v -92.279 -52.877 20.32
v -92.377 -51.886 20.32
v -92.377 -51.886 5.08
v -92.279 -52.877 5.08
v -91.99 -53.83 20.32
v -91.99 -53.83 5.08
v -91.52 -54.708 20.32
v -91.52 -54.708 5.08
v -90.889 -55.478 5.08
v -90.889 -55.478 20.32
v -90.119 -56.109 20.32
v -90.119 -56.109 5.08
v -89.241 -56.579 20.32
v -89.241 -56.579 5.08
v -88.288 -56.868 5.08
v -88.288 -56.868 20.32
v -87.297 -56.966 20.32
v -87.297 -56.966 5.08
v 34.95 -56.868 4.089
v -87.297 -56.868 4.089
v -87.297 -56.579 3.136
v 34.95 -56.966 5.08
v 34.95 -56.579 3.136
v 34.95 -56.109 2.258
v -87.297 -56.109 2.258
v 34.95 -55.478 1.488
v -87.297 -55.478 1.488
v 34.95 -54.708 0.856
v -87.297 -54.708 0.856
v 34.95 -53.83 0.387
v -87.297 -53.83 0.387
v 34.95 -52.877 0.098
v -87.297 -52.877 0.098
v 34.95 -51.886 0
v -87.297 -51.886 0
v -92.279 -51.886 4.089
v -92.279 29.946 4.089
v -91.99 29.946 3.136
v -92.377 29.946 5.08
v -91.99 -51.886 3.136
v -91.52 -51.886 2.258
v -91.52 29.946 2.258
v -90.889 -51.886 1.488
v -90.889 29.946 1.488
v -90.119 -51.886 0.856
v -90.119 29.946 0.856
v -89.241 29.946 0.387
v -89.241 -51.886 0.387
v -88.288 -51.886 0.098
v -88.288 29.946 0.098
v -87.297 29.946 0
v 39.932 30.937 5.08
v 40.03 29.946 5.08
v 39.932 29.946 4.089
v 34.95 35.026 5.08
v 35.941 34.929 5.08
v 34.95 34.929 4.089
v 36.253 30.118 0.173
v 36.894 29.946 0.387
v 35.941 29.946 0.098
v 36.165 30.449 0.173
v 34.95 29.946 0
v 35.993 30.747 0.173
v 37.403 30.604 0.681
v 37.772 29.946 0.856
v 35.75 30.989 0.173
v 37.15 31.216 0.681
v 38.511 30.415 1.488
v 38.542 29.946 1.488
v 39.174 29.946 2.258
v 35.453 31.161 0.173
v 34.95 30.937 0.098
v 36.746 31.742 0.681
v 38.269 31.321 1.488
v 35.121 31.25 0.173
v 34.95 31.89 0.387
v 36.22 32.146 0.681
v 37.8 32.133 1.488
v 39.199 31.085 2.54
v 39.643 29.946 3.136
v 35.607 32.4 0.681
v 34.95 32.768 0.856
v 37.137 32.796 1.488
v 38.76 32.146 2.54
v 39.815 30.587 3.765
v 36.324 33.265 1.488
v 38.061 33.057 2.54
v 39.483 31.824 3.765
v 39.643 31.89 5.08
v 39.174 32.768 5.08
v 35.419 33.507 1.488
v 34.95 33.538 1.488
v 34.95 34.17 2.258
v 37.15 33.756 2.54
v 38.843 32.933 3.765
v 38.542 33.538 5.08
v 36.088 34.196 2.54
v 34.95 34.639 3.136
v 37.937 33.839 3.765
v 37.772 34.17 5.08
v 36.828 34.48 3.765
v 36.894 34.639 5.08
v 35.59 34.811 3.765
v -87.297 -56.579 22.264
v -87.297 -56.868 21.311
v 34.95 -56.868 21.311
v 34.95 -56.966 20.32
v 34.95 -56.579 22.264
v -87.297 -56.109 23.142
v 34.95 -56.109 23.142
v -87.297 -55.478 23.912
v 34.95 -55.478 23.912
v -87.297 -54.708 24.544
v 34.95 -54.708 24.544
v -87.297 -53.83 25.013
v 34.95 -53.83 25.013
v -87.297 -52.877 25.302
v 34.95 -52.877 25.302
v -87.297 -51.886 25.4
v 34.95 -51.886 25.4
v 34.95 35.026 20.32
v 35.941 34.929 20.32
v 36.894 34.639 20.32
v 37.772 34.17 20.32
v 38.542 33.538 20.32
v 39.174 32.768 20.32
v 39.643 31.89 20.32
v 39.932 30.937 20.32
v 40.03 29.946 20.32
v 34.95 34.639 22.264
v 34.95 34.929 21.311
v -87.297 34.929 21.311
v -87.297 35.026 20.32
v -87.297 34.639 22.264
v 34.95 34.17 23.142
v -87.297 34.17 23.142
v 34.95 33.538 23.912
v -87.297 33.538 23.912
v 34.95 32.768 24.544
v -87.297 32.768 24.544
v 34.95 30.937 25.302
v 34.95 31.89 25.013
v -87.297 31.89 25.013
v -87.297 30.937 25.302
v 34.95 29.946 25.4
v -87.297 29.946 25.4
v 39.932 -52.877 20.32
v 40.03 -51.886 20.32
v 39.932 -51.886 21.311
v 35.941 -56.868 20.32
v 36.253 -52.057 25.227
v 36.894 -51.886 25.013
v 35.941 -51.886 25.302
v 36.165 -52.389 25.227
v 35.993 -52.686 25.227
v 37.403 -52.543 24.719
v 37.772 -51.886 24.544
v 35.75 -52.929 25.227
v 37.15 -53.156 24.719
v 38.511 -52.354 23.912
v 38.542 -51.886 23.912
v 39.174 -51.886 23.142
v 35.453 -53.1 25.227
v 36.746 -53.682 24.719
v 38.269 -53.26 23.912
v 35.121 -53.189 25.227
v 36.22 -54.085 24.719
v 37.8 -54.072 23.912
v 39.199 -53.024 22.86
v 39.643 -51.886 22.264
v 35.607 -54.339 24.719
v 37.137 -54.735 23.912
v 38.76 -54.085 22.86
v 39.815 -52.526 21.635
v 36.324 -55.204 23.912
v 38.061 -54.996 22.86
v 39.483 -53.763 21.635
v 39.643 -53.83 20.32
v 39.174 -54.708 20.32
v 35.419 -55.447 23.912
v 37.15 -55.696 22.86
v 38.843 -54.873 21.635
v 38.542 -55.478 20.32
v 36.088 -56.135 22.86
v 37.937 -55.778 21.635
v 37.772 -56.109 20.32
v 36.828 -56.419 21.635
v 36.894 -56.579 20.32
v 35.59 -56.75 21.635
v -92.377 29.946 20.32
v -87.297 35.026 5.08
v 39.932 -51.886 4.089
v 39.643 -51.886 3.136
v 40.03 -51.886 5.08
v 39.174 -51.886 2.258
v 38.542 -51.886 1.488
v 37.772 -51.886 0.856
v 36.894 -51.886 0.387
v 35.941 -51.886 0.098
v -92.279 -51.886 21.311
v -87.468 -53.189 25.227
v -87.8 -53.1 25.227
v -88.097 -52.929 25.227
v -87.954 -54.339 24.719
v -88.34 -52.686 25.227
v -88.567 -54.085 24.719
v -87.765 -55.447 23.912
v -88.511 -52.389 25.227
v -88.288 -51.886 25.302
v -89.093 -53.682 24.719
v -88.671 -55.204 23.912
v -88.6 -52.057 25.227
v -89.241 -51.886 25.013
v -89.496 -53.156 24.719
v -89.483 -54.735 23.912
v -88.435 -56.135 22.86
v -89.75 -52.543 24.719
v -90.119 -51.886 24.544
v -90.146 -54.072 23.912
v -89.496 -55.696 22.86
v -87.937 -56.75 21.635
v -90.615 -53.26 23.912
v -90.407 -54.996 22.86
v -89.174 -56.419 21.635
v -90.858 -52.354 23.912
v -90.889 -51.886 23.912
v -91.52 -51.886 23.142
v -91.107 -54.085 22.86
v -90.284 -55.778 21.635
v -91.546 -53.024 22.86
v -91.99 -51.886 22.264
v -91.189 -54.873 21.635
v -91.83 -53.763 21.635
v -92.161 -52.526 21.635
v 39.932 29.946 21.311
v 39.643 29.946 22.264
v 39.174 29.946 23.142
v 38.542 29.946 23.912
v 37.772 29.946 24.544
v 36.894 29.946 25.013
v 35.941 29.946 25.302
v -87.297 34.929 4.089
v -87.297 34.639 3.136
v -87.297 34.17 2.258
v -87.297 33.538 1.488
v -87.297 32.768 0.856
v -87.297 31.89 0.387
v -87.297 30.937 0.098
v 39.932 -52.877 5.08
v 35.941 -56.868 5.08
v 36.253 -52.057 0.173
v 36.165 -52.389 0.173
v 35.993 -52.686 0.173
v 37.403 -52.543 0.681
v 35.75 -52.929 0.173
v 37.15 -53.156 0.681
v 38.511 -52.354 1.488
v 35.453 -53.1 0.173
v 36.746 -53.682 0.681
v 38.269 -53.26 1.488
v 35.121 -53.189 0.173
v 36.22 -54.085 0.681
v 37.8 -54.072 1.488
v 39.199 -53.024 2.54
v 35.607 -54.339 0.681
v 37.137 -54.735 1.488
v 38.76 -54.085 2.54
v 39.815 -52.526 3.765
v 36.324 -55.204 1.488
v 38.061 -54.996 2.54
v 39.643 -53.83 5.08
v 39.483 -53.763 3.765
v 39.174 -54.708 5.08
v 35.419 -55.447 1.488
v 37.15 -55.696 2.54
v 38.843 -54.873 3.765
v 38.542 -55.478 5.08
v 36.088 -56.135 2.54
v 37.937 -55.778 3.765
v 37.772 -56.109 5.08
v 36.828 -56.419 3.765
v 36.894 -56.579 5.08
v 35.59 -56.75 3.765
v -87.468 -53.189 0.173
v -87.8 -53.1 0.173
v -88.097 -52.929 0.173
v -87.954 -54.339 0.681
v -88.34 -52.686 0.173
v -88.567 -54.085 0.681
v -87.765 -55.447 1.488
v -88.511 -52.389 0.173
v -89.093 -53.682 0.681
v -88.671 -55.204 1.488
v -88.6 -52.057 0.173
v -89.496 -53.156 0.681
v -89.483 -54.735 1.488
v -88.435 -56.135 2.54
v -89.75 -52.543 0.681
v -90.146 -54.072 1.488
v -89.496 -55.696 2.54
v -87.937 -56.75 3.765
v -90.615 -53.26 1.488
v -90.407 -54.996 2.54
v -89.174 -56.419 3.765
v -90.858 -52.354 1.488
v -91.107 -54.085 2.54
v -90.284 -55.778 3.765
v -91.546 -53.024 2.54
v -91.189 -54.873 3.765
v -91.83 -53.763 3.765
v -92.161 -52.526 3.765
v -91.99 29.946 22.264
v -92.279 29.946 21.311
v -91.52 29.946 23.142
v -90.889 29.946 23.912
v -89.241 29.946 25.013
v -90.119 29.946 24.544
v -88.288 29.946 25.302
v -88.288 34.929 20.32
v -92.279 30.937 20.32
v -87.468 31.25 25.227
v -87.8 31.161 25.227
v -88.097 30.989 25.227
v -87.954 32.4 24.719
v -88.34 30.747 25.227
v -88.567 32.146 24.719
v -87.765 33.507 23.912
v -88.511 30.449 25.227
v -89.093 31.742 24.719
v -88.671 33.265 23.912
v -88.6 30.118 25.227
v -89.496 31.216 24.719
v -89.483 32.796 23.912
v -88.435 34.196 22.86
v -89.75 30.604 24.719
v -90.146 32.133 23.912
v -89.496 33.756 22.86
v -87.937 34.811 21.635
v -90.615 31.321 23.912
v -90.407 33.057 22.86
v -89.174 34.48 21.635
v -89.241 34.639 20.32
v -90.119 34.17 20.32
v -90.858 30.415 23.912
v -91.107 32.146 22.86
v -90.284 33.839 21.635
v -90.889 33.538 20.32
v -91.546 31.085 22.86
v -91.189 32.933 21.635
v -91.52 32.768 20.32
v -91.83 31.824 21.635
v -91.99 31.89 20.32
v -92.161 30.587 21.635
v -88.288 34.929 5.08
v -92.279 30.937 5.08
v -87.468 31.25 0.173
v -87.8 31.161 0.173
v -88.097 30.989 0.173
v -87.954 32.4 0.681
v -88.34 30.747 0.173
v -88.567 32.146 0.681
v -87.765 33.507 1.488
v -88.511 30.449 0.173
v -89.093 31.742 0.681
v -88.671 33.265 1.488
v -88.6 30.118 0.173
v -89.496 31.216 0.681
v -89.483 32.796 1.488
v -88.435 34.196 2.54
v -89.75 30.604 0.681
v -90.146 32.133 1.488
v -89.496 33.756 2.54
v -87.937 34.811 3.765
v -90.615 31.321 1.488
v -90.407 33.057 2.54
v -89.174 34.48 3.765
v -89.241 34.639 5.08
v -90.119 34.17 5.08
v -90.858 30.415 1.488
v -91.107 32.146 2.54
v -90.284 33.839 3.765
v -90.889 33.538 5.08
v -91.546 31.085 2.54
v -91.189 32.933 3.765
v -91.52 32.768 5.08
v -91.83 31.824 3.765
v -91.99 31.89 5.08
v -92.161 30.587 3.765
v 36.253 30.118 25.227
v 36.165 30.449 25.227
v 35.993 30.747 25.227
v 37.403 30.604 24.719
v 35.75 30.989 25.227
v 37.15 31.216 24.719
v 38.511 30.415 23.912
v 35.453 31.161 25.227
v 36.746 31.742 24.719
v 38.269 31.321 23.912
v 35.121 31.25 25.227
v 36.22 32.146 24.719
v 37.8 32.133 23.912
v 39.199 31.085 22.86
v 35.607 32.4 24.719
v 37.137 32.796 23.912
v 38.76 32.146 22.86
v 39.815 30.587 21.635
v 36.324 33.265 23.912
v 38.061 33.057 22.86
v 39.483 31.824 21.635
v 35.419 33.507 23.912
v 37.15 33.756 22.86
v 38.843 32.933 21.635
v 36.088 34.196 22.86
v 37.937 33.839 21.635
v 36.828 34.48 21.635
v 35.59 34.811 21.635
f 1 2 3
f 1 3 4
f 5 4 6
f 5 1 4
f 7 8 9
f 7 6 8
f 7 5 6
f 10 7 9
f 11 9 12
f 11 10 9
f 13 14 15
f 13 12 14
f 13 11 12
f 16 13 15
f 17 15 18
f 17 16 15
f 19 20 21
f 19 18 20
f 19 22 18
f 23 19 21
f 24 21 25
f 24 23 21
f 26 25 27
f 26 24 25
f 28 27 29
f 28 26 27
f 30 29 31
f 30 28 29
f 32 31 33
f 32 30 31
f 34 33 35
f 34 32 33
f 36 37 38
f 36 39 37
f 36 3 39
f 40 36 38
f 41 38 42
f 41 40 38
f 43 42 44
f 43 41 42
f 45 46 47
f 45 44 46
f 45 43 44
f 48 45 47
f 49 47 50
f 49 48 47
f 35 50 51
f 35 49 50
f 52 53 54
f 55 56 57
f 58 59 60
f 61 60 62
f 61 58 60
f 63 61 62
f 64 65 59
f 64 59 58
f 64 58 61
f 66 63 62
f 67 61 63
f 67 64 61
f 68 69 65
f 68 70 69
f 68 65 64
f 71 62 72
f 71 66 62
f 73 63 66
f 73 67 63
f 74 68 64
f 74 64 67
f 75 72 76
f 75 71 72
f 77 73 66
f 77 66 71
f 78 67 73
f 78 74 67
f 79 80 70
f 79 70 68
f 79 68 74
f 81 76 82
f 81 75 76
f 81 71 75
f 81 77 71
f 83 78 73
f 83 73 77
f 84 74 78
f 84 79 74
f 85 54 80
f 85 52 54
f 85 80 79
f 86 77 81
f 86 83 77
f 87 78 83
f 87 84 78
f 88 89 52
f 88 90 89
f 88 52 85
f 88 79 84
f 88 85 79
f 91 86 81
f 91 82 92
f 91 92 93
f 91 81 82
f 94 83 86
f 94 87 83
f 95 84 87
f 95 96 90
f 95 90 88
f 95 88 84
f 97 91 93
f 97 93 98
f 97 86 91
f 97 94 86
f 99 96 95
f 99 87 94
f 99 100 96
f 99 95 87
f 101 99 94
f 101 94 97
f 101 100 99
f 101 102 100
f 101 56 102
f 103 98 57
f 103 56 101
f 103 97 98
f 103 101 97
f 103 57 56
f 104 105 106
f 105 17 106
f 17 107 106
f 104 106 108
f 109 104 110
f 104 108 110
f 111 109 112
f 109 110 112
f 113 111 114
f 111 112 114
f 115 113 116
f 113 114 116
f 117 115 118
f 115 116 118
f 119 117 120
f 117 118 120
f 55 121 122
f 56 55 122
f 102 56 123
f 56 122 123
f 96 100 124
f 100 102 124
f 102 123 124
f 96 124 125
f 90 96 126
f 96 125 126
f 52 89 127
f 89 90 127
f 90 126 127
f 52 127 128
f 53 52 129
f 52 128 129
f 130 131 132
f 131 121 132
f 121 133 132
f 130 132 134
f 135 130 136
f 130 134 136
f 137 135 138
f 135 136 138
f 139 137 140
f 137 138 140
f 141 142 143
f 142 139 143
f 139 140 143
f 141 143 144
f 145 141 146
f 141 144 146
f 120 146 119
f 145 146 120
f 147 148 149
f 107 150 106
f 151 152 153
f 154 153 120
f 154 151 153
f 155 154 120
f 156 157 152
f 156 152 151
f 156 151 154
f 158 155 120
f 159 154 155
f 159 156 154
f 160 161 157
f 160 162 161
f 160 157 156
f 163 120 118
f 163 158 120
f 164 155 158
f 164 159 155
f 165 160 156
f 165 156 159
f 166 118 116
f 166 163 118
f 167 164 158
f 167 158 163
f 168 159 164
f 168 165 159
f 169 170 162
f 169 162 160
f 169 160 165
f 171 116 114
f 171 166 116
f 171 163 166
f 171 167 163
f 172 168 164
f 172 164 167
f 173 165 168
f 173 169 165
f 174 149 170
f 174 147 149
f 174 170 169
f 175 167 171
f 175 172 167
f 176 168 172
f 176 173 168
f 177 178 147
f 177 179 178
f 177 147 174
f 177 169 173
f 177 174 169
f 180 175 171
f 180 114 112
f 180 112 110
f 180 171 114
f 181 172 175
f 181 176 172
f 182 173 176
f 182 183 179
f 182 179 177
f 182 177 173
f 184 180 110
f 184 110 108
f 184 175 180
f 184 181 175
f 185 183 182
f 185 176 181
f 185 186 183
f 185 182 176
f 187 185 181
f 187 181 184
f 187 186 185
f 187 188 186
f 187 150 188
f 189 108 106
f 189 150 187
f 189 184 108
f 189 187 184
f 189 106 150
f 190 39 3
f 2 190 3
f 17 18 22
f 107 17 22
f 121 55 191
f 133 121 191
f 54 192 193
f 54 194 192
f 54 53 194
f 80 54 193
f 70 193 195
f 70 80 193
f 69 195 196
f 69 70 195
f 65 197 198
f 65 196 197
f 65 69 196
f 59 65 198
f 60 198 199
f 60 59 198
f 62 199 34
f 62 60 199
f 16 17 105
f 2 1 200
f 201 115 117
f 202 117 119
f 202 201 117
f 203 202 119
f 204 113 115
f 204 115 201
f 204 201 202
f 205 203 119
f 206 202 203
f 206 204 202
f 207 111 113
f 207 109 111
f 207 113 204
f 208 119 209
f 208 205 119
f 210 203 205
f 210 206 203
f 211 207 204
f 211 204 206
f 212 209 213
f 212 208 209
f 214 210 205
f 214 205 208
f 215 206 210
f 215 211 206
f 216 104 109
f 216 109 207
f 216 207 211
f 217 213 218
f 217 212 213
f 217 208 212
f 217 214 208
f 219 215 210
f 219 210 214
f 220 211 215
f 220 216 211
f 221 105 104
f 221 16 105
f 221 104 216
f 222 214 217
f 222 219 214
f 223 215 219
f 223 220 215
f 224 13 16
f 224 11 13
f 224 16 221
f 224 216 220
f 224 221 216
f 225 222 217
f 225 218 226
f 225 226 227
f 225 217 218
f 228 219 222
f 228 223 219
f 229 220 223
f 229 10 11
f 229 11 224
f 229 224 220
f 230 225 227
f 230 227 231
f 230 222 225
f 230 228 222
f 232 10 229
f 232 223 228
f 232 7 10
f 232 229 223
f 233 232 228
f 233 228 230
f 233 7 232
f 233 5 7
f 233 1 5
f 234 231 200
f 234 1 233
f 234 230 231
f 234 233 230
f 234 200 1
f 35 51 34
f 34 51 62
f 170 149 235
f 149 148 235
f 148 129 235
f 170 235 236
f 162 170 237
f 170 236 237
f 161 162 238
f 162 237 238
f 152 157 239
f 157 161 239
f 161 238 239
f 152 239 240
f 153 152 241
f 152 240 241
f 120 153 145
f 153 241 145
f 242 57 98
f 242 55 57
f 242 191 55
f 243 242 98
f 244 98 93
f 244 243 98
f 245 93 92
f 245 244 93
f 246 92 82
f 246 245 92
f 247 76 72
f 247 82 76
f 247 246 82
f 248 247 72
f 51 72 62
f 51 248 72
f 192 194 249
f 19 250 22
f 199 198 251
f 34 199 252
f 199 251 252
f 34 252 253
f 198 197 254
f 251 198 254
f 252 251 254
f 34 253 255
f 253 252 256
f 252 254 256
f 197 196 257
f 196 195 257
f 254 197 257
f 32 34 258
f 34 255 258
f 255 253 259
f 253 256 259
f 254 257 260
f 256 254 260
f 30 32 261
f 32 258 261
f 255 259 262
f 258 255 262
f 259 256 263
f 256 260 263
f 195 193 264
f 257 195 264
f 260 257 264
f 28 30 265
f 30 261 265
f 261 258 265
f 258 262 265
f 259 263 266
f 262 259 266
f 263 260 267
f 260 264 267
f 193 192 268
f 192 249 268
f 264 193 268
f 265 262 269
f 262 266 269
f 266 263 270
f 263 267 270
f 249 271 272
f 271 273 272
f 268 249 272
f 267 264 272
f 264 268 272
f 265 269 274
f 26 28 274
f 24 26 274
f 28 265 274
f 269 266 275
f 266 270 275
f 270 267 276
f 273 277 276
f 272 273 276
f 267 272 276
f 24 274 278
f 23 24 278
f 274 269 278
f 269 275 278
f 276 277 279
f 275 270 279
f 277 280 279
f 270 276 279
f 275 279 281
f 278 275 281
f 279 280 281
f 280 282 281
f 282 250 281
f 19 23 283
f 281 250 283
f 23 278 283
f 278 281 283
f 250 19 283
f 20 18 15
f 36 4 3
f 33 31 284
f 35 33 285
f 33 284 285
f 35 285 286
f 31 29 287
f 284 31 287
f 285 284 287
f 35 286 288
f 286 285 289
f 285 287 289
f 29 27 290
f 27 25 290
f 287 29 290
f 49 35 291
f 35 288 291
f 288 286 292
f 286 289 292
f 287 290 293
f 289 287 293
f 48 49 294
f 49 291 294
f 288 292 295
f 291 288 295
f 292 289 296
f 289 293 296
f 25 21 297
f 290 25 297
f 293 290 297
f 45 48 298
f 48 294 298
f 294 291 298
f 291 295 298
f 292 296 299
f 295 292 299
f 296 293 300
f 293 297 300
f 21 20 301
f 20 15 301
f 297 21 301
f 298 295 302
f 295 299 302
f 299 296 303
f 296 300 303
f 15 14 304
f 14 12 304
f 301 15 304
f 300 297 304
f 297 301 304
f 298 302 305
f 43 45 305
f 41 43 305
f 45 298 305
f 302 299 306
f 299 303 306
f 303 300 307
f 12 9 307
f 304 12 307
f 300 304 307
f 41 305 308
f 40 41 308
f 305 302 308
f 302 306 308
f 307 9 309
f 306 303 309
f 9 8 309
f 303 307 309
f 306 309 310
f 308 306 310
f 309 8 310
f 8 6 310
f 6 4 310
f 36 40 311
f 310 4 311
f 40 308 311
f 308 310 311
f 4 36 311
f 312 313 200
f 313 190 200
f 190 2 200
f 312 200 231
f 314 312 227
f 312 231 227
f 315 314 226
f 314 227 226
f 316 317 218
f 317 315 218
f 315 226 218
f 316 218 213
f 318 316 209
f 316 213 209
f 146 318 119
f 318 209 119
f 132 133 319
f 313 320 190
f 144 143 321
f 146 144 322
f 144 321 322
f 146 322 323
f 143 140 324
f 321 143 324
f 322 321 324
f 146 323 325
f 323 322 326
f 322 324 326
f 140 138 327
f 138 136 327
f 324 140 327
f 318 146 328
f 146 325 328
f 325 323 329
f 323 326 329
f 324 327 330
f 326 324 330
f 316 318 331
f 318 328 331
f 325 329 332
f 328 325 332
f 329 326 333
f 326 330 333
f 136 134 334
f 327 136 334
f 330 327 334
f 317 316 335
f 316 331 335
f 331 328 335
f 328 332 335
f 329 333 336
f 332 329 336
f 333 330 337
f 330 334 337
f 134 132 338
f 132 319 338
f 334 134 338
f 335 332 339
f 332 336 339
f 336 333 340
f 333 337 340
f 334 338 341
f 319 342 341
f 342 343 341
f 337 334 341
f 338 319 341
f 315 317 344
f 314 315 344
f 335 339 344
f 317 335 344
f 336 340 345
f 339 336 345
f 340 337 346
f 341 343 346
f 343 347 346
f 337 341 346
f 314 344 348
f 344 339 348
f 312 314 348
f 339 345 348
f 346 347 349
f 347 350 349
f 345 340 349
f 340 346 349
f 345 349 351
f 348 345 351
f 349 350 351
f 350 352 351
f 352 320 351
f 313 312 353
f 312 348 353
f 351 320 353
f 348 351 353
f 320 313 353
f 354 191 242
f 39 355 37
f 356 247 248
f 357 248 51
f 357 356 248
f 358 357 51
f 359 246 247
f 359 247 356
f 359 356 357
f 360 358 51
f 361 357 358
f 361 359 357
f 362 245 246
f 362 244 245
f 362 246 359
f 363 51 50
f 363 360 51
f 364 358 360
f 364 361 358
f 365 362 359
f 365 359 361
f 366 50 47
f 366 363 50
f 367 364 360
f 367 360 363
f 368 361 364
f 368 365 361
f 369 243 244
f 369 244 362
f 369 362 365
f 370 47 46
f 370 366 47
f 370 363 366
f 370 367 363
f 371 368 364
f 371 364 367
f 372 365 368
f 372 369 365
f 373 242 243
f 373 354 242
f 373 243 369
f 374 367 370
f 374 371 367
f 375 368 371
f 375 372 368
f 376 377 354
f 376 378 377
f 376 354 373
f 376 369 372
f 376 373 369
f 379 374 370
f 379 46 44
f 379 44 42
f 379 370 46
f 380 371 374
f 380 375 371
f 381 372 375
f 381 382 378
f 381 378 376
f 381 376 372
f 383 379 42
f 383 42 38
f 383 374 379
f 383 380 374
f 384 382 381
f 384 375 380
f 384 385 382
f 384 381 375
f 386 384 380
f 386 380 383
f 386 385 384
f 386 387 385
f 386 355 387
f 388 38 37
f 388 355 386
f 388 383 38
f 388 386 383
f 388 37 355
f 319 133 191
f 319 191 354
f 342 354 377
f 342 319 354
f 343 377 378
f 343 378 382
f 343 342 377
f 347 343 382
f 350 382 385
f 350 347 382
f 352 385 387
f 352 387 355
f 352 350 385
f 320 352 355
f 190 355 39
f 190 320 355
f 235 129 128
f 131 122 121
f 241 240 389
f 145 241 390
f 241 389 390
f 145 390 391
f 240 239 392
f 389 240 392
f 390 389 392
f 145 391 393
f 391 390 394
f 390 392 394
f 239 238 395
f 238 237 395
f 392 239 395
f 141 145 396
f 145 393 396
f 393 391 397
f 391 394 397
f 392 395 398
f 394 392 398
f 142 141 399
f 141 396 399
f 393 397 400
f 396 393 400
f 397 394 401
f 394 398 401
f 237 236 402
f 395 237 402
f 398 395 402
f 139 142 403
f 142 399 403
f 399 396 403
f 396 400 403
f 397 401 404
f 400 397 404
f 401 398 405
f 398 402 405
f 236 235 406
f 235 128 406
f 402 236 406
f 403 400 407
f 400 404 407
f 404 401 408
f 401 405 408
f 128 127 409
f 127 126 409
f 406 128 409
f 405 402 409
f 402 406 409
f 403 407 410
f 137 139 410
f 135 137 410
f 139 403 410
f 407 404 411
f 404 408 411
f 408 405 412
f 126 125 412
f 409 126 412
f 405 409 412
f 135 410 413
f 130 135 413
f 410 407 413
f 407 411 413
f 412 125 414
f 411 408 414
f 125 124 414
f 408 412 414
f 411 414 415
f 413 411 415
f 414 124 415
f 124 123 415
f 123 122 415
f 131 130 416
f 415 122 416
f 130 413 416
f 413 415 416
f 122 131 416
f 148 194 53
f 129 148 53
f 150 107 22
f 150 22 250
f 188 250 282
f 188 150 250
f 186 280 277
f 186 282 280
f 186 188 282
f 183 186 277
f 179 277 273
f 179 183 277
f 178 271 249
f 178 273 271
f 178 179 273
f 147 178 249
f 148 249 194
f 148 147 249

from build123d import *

# Parameters (mm, degrees)
F1_DEPTH = 25.4
F2_R     = 5.08


with BuildPart() as f1:
    # F0 (on Top) → F1 (new body)
    with BuildSketch(Plane.XY):
        with BuildLine():
            Line((40.0298386812, 35.026114434), (-92.3765525222, 35.026114434))
            Line((-92.3765525222, 35.026114434), (-92.3765525222, 0))
            Line((-92.3765525222, 0), (-54.1899020415, 0))
            ThreePointArc((-54.1899020415, 0), (-29.6374764293, 14.3361382619), (-5.0850508172, 0))
            Line((-5.0850508172, 0), (40.0298386812, 0))
            Line((40.0298386812, 0), (40.0298386812, 35.026114434))
        make_face()
        with BuildLine():
            Line((-54.1899020415, 0), (-92.3765525222, 0))
            Line((-92.3765525222, 0), (-92.3765525222, -30.0223715603))
            Line((-92.3765525222, -30.0223715603), (-52.7348229784, -30.0223715603))
            ThreePointArc((-52.7348229784, -30.0223715603), (-57.7970377768, -15.2212722889), (-54.1899020415, 0))
        make_face()
        with BuildLine():
            Line((40.0298386812, -30.0223715603), (40.0298386812, 0))
            Line((40.0298386812, 0), (-5.0850508172, 0))
            ThreePointArc((-5.0850508172, 0), (-2.3700906657, -6.6931514243), (-1.4448610633, -13.8564771041))
            ThreePointArc((-1.4448610633, -13.8564771041), (-2.7488341392, -22.3314093736), (-6.5401298802, -30.0223715603))
            Line((-6.5401298802, -30.0223715603), (40.0298386812, -30.0223715603))
        make_face()
        with BuildLine():
            Line((-52.7348229784, -30.0223715603), (-92.3765525222, -30.0223715603))
            Line((-92.3765525222, -30.0223715603), (-92.3765525222, -56.965533644))
            Line((-92.3765525222, -56.965533644), (40.0298386812, -56.965533644))
            Line((40.0298386812, -56.965533644), (40.0298386812, -30.0223715603))
            Line((40.0298386812, -30.0223715603), (-6.5401298802, -30.0223715603))
            ThreePointArc((-6.5401298802, -30.0223715603), (-29.6374764293, -42.0490924702), (-52.7348229784, -30.0223715603))
        make_face()
        with BuildLine():
            ThreePointArc((-5.0850508172, 0), (-29.6374764293, 14.3361382619), (-54.1899020415, 0))
            Line((-54.1899020415, 0), (-26.1733569205, 0))
            Line((-26.1733569205, 0), (-5.0850508172, 0))
        make_face()
        with BuildLine():
            Line((-26.1733569205, 0), (-54.1899020415, 0))
            ThreePointArc((-54.1899020415, 0), (-57.7970377768, -15.2212722889), (-52.7348229784, -30.0223715603))
            Line((-52.7348229784, -30.0223715603), (-6.5401298802, -30.0223715603))
            ThreePointArc((-6.5401298802, -30.0223715603), (-2.7488341392, -22.3314093736), (-1.4448610633, -13.8564771041))
            ThreePointArc((-1.4448610633, -13.8564771041), (-2.3700906657, -6.6931514243), (-5.0850508172, 0))
            Line((-5.0850508172, 0), (-26.1733569205, 0))
        make_face()
        with BuildLine():
            Line((-6.5401298802, -30.0223715603), (-52.7348229784, -30.0223715603))
            ThreePointArc((-52.7348229784, -30.0223715603), (-29.6374764293, -42.0490924702), (-6.5401298802, -30.0223715603))
        make_face()
    extrude(amount=F1_DEPTH)

    # F2
    f2_edges = [f1.edges().sort_by_distance(p)[0] for p in [
        (40.029839, -56.965534, 12.7),
        (40.029839, 35.026114, 12.7),
        (40.029839, -10.96971, 0),
        (40.029839, -10.96971, 25.4),
        (-92.376553, -56.965534, 12.7),
        (-26.173357, -56.965534, 0),
        (-26.173357, -56.965534, 25.4),
        (-92.376553, 35.026114, 12.7),
        (-26.173357, 35.026114, 0),
        (-26.173357, 35.026114, 25.4),
        (-92.376553, -10.96971, 0),
        (-92.376553, -10.96971, 25.4),
    ]]
    fillet(f2_edges, radius=F2_R)


solid = f1.part
